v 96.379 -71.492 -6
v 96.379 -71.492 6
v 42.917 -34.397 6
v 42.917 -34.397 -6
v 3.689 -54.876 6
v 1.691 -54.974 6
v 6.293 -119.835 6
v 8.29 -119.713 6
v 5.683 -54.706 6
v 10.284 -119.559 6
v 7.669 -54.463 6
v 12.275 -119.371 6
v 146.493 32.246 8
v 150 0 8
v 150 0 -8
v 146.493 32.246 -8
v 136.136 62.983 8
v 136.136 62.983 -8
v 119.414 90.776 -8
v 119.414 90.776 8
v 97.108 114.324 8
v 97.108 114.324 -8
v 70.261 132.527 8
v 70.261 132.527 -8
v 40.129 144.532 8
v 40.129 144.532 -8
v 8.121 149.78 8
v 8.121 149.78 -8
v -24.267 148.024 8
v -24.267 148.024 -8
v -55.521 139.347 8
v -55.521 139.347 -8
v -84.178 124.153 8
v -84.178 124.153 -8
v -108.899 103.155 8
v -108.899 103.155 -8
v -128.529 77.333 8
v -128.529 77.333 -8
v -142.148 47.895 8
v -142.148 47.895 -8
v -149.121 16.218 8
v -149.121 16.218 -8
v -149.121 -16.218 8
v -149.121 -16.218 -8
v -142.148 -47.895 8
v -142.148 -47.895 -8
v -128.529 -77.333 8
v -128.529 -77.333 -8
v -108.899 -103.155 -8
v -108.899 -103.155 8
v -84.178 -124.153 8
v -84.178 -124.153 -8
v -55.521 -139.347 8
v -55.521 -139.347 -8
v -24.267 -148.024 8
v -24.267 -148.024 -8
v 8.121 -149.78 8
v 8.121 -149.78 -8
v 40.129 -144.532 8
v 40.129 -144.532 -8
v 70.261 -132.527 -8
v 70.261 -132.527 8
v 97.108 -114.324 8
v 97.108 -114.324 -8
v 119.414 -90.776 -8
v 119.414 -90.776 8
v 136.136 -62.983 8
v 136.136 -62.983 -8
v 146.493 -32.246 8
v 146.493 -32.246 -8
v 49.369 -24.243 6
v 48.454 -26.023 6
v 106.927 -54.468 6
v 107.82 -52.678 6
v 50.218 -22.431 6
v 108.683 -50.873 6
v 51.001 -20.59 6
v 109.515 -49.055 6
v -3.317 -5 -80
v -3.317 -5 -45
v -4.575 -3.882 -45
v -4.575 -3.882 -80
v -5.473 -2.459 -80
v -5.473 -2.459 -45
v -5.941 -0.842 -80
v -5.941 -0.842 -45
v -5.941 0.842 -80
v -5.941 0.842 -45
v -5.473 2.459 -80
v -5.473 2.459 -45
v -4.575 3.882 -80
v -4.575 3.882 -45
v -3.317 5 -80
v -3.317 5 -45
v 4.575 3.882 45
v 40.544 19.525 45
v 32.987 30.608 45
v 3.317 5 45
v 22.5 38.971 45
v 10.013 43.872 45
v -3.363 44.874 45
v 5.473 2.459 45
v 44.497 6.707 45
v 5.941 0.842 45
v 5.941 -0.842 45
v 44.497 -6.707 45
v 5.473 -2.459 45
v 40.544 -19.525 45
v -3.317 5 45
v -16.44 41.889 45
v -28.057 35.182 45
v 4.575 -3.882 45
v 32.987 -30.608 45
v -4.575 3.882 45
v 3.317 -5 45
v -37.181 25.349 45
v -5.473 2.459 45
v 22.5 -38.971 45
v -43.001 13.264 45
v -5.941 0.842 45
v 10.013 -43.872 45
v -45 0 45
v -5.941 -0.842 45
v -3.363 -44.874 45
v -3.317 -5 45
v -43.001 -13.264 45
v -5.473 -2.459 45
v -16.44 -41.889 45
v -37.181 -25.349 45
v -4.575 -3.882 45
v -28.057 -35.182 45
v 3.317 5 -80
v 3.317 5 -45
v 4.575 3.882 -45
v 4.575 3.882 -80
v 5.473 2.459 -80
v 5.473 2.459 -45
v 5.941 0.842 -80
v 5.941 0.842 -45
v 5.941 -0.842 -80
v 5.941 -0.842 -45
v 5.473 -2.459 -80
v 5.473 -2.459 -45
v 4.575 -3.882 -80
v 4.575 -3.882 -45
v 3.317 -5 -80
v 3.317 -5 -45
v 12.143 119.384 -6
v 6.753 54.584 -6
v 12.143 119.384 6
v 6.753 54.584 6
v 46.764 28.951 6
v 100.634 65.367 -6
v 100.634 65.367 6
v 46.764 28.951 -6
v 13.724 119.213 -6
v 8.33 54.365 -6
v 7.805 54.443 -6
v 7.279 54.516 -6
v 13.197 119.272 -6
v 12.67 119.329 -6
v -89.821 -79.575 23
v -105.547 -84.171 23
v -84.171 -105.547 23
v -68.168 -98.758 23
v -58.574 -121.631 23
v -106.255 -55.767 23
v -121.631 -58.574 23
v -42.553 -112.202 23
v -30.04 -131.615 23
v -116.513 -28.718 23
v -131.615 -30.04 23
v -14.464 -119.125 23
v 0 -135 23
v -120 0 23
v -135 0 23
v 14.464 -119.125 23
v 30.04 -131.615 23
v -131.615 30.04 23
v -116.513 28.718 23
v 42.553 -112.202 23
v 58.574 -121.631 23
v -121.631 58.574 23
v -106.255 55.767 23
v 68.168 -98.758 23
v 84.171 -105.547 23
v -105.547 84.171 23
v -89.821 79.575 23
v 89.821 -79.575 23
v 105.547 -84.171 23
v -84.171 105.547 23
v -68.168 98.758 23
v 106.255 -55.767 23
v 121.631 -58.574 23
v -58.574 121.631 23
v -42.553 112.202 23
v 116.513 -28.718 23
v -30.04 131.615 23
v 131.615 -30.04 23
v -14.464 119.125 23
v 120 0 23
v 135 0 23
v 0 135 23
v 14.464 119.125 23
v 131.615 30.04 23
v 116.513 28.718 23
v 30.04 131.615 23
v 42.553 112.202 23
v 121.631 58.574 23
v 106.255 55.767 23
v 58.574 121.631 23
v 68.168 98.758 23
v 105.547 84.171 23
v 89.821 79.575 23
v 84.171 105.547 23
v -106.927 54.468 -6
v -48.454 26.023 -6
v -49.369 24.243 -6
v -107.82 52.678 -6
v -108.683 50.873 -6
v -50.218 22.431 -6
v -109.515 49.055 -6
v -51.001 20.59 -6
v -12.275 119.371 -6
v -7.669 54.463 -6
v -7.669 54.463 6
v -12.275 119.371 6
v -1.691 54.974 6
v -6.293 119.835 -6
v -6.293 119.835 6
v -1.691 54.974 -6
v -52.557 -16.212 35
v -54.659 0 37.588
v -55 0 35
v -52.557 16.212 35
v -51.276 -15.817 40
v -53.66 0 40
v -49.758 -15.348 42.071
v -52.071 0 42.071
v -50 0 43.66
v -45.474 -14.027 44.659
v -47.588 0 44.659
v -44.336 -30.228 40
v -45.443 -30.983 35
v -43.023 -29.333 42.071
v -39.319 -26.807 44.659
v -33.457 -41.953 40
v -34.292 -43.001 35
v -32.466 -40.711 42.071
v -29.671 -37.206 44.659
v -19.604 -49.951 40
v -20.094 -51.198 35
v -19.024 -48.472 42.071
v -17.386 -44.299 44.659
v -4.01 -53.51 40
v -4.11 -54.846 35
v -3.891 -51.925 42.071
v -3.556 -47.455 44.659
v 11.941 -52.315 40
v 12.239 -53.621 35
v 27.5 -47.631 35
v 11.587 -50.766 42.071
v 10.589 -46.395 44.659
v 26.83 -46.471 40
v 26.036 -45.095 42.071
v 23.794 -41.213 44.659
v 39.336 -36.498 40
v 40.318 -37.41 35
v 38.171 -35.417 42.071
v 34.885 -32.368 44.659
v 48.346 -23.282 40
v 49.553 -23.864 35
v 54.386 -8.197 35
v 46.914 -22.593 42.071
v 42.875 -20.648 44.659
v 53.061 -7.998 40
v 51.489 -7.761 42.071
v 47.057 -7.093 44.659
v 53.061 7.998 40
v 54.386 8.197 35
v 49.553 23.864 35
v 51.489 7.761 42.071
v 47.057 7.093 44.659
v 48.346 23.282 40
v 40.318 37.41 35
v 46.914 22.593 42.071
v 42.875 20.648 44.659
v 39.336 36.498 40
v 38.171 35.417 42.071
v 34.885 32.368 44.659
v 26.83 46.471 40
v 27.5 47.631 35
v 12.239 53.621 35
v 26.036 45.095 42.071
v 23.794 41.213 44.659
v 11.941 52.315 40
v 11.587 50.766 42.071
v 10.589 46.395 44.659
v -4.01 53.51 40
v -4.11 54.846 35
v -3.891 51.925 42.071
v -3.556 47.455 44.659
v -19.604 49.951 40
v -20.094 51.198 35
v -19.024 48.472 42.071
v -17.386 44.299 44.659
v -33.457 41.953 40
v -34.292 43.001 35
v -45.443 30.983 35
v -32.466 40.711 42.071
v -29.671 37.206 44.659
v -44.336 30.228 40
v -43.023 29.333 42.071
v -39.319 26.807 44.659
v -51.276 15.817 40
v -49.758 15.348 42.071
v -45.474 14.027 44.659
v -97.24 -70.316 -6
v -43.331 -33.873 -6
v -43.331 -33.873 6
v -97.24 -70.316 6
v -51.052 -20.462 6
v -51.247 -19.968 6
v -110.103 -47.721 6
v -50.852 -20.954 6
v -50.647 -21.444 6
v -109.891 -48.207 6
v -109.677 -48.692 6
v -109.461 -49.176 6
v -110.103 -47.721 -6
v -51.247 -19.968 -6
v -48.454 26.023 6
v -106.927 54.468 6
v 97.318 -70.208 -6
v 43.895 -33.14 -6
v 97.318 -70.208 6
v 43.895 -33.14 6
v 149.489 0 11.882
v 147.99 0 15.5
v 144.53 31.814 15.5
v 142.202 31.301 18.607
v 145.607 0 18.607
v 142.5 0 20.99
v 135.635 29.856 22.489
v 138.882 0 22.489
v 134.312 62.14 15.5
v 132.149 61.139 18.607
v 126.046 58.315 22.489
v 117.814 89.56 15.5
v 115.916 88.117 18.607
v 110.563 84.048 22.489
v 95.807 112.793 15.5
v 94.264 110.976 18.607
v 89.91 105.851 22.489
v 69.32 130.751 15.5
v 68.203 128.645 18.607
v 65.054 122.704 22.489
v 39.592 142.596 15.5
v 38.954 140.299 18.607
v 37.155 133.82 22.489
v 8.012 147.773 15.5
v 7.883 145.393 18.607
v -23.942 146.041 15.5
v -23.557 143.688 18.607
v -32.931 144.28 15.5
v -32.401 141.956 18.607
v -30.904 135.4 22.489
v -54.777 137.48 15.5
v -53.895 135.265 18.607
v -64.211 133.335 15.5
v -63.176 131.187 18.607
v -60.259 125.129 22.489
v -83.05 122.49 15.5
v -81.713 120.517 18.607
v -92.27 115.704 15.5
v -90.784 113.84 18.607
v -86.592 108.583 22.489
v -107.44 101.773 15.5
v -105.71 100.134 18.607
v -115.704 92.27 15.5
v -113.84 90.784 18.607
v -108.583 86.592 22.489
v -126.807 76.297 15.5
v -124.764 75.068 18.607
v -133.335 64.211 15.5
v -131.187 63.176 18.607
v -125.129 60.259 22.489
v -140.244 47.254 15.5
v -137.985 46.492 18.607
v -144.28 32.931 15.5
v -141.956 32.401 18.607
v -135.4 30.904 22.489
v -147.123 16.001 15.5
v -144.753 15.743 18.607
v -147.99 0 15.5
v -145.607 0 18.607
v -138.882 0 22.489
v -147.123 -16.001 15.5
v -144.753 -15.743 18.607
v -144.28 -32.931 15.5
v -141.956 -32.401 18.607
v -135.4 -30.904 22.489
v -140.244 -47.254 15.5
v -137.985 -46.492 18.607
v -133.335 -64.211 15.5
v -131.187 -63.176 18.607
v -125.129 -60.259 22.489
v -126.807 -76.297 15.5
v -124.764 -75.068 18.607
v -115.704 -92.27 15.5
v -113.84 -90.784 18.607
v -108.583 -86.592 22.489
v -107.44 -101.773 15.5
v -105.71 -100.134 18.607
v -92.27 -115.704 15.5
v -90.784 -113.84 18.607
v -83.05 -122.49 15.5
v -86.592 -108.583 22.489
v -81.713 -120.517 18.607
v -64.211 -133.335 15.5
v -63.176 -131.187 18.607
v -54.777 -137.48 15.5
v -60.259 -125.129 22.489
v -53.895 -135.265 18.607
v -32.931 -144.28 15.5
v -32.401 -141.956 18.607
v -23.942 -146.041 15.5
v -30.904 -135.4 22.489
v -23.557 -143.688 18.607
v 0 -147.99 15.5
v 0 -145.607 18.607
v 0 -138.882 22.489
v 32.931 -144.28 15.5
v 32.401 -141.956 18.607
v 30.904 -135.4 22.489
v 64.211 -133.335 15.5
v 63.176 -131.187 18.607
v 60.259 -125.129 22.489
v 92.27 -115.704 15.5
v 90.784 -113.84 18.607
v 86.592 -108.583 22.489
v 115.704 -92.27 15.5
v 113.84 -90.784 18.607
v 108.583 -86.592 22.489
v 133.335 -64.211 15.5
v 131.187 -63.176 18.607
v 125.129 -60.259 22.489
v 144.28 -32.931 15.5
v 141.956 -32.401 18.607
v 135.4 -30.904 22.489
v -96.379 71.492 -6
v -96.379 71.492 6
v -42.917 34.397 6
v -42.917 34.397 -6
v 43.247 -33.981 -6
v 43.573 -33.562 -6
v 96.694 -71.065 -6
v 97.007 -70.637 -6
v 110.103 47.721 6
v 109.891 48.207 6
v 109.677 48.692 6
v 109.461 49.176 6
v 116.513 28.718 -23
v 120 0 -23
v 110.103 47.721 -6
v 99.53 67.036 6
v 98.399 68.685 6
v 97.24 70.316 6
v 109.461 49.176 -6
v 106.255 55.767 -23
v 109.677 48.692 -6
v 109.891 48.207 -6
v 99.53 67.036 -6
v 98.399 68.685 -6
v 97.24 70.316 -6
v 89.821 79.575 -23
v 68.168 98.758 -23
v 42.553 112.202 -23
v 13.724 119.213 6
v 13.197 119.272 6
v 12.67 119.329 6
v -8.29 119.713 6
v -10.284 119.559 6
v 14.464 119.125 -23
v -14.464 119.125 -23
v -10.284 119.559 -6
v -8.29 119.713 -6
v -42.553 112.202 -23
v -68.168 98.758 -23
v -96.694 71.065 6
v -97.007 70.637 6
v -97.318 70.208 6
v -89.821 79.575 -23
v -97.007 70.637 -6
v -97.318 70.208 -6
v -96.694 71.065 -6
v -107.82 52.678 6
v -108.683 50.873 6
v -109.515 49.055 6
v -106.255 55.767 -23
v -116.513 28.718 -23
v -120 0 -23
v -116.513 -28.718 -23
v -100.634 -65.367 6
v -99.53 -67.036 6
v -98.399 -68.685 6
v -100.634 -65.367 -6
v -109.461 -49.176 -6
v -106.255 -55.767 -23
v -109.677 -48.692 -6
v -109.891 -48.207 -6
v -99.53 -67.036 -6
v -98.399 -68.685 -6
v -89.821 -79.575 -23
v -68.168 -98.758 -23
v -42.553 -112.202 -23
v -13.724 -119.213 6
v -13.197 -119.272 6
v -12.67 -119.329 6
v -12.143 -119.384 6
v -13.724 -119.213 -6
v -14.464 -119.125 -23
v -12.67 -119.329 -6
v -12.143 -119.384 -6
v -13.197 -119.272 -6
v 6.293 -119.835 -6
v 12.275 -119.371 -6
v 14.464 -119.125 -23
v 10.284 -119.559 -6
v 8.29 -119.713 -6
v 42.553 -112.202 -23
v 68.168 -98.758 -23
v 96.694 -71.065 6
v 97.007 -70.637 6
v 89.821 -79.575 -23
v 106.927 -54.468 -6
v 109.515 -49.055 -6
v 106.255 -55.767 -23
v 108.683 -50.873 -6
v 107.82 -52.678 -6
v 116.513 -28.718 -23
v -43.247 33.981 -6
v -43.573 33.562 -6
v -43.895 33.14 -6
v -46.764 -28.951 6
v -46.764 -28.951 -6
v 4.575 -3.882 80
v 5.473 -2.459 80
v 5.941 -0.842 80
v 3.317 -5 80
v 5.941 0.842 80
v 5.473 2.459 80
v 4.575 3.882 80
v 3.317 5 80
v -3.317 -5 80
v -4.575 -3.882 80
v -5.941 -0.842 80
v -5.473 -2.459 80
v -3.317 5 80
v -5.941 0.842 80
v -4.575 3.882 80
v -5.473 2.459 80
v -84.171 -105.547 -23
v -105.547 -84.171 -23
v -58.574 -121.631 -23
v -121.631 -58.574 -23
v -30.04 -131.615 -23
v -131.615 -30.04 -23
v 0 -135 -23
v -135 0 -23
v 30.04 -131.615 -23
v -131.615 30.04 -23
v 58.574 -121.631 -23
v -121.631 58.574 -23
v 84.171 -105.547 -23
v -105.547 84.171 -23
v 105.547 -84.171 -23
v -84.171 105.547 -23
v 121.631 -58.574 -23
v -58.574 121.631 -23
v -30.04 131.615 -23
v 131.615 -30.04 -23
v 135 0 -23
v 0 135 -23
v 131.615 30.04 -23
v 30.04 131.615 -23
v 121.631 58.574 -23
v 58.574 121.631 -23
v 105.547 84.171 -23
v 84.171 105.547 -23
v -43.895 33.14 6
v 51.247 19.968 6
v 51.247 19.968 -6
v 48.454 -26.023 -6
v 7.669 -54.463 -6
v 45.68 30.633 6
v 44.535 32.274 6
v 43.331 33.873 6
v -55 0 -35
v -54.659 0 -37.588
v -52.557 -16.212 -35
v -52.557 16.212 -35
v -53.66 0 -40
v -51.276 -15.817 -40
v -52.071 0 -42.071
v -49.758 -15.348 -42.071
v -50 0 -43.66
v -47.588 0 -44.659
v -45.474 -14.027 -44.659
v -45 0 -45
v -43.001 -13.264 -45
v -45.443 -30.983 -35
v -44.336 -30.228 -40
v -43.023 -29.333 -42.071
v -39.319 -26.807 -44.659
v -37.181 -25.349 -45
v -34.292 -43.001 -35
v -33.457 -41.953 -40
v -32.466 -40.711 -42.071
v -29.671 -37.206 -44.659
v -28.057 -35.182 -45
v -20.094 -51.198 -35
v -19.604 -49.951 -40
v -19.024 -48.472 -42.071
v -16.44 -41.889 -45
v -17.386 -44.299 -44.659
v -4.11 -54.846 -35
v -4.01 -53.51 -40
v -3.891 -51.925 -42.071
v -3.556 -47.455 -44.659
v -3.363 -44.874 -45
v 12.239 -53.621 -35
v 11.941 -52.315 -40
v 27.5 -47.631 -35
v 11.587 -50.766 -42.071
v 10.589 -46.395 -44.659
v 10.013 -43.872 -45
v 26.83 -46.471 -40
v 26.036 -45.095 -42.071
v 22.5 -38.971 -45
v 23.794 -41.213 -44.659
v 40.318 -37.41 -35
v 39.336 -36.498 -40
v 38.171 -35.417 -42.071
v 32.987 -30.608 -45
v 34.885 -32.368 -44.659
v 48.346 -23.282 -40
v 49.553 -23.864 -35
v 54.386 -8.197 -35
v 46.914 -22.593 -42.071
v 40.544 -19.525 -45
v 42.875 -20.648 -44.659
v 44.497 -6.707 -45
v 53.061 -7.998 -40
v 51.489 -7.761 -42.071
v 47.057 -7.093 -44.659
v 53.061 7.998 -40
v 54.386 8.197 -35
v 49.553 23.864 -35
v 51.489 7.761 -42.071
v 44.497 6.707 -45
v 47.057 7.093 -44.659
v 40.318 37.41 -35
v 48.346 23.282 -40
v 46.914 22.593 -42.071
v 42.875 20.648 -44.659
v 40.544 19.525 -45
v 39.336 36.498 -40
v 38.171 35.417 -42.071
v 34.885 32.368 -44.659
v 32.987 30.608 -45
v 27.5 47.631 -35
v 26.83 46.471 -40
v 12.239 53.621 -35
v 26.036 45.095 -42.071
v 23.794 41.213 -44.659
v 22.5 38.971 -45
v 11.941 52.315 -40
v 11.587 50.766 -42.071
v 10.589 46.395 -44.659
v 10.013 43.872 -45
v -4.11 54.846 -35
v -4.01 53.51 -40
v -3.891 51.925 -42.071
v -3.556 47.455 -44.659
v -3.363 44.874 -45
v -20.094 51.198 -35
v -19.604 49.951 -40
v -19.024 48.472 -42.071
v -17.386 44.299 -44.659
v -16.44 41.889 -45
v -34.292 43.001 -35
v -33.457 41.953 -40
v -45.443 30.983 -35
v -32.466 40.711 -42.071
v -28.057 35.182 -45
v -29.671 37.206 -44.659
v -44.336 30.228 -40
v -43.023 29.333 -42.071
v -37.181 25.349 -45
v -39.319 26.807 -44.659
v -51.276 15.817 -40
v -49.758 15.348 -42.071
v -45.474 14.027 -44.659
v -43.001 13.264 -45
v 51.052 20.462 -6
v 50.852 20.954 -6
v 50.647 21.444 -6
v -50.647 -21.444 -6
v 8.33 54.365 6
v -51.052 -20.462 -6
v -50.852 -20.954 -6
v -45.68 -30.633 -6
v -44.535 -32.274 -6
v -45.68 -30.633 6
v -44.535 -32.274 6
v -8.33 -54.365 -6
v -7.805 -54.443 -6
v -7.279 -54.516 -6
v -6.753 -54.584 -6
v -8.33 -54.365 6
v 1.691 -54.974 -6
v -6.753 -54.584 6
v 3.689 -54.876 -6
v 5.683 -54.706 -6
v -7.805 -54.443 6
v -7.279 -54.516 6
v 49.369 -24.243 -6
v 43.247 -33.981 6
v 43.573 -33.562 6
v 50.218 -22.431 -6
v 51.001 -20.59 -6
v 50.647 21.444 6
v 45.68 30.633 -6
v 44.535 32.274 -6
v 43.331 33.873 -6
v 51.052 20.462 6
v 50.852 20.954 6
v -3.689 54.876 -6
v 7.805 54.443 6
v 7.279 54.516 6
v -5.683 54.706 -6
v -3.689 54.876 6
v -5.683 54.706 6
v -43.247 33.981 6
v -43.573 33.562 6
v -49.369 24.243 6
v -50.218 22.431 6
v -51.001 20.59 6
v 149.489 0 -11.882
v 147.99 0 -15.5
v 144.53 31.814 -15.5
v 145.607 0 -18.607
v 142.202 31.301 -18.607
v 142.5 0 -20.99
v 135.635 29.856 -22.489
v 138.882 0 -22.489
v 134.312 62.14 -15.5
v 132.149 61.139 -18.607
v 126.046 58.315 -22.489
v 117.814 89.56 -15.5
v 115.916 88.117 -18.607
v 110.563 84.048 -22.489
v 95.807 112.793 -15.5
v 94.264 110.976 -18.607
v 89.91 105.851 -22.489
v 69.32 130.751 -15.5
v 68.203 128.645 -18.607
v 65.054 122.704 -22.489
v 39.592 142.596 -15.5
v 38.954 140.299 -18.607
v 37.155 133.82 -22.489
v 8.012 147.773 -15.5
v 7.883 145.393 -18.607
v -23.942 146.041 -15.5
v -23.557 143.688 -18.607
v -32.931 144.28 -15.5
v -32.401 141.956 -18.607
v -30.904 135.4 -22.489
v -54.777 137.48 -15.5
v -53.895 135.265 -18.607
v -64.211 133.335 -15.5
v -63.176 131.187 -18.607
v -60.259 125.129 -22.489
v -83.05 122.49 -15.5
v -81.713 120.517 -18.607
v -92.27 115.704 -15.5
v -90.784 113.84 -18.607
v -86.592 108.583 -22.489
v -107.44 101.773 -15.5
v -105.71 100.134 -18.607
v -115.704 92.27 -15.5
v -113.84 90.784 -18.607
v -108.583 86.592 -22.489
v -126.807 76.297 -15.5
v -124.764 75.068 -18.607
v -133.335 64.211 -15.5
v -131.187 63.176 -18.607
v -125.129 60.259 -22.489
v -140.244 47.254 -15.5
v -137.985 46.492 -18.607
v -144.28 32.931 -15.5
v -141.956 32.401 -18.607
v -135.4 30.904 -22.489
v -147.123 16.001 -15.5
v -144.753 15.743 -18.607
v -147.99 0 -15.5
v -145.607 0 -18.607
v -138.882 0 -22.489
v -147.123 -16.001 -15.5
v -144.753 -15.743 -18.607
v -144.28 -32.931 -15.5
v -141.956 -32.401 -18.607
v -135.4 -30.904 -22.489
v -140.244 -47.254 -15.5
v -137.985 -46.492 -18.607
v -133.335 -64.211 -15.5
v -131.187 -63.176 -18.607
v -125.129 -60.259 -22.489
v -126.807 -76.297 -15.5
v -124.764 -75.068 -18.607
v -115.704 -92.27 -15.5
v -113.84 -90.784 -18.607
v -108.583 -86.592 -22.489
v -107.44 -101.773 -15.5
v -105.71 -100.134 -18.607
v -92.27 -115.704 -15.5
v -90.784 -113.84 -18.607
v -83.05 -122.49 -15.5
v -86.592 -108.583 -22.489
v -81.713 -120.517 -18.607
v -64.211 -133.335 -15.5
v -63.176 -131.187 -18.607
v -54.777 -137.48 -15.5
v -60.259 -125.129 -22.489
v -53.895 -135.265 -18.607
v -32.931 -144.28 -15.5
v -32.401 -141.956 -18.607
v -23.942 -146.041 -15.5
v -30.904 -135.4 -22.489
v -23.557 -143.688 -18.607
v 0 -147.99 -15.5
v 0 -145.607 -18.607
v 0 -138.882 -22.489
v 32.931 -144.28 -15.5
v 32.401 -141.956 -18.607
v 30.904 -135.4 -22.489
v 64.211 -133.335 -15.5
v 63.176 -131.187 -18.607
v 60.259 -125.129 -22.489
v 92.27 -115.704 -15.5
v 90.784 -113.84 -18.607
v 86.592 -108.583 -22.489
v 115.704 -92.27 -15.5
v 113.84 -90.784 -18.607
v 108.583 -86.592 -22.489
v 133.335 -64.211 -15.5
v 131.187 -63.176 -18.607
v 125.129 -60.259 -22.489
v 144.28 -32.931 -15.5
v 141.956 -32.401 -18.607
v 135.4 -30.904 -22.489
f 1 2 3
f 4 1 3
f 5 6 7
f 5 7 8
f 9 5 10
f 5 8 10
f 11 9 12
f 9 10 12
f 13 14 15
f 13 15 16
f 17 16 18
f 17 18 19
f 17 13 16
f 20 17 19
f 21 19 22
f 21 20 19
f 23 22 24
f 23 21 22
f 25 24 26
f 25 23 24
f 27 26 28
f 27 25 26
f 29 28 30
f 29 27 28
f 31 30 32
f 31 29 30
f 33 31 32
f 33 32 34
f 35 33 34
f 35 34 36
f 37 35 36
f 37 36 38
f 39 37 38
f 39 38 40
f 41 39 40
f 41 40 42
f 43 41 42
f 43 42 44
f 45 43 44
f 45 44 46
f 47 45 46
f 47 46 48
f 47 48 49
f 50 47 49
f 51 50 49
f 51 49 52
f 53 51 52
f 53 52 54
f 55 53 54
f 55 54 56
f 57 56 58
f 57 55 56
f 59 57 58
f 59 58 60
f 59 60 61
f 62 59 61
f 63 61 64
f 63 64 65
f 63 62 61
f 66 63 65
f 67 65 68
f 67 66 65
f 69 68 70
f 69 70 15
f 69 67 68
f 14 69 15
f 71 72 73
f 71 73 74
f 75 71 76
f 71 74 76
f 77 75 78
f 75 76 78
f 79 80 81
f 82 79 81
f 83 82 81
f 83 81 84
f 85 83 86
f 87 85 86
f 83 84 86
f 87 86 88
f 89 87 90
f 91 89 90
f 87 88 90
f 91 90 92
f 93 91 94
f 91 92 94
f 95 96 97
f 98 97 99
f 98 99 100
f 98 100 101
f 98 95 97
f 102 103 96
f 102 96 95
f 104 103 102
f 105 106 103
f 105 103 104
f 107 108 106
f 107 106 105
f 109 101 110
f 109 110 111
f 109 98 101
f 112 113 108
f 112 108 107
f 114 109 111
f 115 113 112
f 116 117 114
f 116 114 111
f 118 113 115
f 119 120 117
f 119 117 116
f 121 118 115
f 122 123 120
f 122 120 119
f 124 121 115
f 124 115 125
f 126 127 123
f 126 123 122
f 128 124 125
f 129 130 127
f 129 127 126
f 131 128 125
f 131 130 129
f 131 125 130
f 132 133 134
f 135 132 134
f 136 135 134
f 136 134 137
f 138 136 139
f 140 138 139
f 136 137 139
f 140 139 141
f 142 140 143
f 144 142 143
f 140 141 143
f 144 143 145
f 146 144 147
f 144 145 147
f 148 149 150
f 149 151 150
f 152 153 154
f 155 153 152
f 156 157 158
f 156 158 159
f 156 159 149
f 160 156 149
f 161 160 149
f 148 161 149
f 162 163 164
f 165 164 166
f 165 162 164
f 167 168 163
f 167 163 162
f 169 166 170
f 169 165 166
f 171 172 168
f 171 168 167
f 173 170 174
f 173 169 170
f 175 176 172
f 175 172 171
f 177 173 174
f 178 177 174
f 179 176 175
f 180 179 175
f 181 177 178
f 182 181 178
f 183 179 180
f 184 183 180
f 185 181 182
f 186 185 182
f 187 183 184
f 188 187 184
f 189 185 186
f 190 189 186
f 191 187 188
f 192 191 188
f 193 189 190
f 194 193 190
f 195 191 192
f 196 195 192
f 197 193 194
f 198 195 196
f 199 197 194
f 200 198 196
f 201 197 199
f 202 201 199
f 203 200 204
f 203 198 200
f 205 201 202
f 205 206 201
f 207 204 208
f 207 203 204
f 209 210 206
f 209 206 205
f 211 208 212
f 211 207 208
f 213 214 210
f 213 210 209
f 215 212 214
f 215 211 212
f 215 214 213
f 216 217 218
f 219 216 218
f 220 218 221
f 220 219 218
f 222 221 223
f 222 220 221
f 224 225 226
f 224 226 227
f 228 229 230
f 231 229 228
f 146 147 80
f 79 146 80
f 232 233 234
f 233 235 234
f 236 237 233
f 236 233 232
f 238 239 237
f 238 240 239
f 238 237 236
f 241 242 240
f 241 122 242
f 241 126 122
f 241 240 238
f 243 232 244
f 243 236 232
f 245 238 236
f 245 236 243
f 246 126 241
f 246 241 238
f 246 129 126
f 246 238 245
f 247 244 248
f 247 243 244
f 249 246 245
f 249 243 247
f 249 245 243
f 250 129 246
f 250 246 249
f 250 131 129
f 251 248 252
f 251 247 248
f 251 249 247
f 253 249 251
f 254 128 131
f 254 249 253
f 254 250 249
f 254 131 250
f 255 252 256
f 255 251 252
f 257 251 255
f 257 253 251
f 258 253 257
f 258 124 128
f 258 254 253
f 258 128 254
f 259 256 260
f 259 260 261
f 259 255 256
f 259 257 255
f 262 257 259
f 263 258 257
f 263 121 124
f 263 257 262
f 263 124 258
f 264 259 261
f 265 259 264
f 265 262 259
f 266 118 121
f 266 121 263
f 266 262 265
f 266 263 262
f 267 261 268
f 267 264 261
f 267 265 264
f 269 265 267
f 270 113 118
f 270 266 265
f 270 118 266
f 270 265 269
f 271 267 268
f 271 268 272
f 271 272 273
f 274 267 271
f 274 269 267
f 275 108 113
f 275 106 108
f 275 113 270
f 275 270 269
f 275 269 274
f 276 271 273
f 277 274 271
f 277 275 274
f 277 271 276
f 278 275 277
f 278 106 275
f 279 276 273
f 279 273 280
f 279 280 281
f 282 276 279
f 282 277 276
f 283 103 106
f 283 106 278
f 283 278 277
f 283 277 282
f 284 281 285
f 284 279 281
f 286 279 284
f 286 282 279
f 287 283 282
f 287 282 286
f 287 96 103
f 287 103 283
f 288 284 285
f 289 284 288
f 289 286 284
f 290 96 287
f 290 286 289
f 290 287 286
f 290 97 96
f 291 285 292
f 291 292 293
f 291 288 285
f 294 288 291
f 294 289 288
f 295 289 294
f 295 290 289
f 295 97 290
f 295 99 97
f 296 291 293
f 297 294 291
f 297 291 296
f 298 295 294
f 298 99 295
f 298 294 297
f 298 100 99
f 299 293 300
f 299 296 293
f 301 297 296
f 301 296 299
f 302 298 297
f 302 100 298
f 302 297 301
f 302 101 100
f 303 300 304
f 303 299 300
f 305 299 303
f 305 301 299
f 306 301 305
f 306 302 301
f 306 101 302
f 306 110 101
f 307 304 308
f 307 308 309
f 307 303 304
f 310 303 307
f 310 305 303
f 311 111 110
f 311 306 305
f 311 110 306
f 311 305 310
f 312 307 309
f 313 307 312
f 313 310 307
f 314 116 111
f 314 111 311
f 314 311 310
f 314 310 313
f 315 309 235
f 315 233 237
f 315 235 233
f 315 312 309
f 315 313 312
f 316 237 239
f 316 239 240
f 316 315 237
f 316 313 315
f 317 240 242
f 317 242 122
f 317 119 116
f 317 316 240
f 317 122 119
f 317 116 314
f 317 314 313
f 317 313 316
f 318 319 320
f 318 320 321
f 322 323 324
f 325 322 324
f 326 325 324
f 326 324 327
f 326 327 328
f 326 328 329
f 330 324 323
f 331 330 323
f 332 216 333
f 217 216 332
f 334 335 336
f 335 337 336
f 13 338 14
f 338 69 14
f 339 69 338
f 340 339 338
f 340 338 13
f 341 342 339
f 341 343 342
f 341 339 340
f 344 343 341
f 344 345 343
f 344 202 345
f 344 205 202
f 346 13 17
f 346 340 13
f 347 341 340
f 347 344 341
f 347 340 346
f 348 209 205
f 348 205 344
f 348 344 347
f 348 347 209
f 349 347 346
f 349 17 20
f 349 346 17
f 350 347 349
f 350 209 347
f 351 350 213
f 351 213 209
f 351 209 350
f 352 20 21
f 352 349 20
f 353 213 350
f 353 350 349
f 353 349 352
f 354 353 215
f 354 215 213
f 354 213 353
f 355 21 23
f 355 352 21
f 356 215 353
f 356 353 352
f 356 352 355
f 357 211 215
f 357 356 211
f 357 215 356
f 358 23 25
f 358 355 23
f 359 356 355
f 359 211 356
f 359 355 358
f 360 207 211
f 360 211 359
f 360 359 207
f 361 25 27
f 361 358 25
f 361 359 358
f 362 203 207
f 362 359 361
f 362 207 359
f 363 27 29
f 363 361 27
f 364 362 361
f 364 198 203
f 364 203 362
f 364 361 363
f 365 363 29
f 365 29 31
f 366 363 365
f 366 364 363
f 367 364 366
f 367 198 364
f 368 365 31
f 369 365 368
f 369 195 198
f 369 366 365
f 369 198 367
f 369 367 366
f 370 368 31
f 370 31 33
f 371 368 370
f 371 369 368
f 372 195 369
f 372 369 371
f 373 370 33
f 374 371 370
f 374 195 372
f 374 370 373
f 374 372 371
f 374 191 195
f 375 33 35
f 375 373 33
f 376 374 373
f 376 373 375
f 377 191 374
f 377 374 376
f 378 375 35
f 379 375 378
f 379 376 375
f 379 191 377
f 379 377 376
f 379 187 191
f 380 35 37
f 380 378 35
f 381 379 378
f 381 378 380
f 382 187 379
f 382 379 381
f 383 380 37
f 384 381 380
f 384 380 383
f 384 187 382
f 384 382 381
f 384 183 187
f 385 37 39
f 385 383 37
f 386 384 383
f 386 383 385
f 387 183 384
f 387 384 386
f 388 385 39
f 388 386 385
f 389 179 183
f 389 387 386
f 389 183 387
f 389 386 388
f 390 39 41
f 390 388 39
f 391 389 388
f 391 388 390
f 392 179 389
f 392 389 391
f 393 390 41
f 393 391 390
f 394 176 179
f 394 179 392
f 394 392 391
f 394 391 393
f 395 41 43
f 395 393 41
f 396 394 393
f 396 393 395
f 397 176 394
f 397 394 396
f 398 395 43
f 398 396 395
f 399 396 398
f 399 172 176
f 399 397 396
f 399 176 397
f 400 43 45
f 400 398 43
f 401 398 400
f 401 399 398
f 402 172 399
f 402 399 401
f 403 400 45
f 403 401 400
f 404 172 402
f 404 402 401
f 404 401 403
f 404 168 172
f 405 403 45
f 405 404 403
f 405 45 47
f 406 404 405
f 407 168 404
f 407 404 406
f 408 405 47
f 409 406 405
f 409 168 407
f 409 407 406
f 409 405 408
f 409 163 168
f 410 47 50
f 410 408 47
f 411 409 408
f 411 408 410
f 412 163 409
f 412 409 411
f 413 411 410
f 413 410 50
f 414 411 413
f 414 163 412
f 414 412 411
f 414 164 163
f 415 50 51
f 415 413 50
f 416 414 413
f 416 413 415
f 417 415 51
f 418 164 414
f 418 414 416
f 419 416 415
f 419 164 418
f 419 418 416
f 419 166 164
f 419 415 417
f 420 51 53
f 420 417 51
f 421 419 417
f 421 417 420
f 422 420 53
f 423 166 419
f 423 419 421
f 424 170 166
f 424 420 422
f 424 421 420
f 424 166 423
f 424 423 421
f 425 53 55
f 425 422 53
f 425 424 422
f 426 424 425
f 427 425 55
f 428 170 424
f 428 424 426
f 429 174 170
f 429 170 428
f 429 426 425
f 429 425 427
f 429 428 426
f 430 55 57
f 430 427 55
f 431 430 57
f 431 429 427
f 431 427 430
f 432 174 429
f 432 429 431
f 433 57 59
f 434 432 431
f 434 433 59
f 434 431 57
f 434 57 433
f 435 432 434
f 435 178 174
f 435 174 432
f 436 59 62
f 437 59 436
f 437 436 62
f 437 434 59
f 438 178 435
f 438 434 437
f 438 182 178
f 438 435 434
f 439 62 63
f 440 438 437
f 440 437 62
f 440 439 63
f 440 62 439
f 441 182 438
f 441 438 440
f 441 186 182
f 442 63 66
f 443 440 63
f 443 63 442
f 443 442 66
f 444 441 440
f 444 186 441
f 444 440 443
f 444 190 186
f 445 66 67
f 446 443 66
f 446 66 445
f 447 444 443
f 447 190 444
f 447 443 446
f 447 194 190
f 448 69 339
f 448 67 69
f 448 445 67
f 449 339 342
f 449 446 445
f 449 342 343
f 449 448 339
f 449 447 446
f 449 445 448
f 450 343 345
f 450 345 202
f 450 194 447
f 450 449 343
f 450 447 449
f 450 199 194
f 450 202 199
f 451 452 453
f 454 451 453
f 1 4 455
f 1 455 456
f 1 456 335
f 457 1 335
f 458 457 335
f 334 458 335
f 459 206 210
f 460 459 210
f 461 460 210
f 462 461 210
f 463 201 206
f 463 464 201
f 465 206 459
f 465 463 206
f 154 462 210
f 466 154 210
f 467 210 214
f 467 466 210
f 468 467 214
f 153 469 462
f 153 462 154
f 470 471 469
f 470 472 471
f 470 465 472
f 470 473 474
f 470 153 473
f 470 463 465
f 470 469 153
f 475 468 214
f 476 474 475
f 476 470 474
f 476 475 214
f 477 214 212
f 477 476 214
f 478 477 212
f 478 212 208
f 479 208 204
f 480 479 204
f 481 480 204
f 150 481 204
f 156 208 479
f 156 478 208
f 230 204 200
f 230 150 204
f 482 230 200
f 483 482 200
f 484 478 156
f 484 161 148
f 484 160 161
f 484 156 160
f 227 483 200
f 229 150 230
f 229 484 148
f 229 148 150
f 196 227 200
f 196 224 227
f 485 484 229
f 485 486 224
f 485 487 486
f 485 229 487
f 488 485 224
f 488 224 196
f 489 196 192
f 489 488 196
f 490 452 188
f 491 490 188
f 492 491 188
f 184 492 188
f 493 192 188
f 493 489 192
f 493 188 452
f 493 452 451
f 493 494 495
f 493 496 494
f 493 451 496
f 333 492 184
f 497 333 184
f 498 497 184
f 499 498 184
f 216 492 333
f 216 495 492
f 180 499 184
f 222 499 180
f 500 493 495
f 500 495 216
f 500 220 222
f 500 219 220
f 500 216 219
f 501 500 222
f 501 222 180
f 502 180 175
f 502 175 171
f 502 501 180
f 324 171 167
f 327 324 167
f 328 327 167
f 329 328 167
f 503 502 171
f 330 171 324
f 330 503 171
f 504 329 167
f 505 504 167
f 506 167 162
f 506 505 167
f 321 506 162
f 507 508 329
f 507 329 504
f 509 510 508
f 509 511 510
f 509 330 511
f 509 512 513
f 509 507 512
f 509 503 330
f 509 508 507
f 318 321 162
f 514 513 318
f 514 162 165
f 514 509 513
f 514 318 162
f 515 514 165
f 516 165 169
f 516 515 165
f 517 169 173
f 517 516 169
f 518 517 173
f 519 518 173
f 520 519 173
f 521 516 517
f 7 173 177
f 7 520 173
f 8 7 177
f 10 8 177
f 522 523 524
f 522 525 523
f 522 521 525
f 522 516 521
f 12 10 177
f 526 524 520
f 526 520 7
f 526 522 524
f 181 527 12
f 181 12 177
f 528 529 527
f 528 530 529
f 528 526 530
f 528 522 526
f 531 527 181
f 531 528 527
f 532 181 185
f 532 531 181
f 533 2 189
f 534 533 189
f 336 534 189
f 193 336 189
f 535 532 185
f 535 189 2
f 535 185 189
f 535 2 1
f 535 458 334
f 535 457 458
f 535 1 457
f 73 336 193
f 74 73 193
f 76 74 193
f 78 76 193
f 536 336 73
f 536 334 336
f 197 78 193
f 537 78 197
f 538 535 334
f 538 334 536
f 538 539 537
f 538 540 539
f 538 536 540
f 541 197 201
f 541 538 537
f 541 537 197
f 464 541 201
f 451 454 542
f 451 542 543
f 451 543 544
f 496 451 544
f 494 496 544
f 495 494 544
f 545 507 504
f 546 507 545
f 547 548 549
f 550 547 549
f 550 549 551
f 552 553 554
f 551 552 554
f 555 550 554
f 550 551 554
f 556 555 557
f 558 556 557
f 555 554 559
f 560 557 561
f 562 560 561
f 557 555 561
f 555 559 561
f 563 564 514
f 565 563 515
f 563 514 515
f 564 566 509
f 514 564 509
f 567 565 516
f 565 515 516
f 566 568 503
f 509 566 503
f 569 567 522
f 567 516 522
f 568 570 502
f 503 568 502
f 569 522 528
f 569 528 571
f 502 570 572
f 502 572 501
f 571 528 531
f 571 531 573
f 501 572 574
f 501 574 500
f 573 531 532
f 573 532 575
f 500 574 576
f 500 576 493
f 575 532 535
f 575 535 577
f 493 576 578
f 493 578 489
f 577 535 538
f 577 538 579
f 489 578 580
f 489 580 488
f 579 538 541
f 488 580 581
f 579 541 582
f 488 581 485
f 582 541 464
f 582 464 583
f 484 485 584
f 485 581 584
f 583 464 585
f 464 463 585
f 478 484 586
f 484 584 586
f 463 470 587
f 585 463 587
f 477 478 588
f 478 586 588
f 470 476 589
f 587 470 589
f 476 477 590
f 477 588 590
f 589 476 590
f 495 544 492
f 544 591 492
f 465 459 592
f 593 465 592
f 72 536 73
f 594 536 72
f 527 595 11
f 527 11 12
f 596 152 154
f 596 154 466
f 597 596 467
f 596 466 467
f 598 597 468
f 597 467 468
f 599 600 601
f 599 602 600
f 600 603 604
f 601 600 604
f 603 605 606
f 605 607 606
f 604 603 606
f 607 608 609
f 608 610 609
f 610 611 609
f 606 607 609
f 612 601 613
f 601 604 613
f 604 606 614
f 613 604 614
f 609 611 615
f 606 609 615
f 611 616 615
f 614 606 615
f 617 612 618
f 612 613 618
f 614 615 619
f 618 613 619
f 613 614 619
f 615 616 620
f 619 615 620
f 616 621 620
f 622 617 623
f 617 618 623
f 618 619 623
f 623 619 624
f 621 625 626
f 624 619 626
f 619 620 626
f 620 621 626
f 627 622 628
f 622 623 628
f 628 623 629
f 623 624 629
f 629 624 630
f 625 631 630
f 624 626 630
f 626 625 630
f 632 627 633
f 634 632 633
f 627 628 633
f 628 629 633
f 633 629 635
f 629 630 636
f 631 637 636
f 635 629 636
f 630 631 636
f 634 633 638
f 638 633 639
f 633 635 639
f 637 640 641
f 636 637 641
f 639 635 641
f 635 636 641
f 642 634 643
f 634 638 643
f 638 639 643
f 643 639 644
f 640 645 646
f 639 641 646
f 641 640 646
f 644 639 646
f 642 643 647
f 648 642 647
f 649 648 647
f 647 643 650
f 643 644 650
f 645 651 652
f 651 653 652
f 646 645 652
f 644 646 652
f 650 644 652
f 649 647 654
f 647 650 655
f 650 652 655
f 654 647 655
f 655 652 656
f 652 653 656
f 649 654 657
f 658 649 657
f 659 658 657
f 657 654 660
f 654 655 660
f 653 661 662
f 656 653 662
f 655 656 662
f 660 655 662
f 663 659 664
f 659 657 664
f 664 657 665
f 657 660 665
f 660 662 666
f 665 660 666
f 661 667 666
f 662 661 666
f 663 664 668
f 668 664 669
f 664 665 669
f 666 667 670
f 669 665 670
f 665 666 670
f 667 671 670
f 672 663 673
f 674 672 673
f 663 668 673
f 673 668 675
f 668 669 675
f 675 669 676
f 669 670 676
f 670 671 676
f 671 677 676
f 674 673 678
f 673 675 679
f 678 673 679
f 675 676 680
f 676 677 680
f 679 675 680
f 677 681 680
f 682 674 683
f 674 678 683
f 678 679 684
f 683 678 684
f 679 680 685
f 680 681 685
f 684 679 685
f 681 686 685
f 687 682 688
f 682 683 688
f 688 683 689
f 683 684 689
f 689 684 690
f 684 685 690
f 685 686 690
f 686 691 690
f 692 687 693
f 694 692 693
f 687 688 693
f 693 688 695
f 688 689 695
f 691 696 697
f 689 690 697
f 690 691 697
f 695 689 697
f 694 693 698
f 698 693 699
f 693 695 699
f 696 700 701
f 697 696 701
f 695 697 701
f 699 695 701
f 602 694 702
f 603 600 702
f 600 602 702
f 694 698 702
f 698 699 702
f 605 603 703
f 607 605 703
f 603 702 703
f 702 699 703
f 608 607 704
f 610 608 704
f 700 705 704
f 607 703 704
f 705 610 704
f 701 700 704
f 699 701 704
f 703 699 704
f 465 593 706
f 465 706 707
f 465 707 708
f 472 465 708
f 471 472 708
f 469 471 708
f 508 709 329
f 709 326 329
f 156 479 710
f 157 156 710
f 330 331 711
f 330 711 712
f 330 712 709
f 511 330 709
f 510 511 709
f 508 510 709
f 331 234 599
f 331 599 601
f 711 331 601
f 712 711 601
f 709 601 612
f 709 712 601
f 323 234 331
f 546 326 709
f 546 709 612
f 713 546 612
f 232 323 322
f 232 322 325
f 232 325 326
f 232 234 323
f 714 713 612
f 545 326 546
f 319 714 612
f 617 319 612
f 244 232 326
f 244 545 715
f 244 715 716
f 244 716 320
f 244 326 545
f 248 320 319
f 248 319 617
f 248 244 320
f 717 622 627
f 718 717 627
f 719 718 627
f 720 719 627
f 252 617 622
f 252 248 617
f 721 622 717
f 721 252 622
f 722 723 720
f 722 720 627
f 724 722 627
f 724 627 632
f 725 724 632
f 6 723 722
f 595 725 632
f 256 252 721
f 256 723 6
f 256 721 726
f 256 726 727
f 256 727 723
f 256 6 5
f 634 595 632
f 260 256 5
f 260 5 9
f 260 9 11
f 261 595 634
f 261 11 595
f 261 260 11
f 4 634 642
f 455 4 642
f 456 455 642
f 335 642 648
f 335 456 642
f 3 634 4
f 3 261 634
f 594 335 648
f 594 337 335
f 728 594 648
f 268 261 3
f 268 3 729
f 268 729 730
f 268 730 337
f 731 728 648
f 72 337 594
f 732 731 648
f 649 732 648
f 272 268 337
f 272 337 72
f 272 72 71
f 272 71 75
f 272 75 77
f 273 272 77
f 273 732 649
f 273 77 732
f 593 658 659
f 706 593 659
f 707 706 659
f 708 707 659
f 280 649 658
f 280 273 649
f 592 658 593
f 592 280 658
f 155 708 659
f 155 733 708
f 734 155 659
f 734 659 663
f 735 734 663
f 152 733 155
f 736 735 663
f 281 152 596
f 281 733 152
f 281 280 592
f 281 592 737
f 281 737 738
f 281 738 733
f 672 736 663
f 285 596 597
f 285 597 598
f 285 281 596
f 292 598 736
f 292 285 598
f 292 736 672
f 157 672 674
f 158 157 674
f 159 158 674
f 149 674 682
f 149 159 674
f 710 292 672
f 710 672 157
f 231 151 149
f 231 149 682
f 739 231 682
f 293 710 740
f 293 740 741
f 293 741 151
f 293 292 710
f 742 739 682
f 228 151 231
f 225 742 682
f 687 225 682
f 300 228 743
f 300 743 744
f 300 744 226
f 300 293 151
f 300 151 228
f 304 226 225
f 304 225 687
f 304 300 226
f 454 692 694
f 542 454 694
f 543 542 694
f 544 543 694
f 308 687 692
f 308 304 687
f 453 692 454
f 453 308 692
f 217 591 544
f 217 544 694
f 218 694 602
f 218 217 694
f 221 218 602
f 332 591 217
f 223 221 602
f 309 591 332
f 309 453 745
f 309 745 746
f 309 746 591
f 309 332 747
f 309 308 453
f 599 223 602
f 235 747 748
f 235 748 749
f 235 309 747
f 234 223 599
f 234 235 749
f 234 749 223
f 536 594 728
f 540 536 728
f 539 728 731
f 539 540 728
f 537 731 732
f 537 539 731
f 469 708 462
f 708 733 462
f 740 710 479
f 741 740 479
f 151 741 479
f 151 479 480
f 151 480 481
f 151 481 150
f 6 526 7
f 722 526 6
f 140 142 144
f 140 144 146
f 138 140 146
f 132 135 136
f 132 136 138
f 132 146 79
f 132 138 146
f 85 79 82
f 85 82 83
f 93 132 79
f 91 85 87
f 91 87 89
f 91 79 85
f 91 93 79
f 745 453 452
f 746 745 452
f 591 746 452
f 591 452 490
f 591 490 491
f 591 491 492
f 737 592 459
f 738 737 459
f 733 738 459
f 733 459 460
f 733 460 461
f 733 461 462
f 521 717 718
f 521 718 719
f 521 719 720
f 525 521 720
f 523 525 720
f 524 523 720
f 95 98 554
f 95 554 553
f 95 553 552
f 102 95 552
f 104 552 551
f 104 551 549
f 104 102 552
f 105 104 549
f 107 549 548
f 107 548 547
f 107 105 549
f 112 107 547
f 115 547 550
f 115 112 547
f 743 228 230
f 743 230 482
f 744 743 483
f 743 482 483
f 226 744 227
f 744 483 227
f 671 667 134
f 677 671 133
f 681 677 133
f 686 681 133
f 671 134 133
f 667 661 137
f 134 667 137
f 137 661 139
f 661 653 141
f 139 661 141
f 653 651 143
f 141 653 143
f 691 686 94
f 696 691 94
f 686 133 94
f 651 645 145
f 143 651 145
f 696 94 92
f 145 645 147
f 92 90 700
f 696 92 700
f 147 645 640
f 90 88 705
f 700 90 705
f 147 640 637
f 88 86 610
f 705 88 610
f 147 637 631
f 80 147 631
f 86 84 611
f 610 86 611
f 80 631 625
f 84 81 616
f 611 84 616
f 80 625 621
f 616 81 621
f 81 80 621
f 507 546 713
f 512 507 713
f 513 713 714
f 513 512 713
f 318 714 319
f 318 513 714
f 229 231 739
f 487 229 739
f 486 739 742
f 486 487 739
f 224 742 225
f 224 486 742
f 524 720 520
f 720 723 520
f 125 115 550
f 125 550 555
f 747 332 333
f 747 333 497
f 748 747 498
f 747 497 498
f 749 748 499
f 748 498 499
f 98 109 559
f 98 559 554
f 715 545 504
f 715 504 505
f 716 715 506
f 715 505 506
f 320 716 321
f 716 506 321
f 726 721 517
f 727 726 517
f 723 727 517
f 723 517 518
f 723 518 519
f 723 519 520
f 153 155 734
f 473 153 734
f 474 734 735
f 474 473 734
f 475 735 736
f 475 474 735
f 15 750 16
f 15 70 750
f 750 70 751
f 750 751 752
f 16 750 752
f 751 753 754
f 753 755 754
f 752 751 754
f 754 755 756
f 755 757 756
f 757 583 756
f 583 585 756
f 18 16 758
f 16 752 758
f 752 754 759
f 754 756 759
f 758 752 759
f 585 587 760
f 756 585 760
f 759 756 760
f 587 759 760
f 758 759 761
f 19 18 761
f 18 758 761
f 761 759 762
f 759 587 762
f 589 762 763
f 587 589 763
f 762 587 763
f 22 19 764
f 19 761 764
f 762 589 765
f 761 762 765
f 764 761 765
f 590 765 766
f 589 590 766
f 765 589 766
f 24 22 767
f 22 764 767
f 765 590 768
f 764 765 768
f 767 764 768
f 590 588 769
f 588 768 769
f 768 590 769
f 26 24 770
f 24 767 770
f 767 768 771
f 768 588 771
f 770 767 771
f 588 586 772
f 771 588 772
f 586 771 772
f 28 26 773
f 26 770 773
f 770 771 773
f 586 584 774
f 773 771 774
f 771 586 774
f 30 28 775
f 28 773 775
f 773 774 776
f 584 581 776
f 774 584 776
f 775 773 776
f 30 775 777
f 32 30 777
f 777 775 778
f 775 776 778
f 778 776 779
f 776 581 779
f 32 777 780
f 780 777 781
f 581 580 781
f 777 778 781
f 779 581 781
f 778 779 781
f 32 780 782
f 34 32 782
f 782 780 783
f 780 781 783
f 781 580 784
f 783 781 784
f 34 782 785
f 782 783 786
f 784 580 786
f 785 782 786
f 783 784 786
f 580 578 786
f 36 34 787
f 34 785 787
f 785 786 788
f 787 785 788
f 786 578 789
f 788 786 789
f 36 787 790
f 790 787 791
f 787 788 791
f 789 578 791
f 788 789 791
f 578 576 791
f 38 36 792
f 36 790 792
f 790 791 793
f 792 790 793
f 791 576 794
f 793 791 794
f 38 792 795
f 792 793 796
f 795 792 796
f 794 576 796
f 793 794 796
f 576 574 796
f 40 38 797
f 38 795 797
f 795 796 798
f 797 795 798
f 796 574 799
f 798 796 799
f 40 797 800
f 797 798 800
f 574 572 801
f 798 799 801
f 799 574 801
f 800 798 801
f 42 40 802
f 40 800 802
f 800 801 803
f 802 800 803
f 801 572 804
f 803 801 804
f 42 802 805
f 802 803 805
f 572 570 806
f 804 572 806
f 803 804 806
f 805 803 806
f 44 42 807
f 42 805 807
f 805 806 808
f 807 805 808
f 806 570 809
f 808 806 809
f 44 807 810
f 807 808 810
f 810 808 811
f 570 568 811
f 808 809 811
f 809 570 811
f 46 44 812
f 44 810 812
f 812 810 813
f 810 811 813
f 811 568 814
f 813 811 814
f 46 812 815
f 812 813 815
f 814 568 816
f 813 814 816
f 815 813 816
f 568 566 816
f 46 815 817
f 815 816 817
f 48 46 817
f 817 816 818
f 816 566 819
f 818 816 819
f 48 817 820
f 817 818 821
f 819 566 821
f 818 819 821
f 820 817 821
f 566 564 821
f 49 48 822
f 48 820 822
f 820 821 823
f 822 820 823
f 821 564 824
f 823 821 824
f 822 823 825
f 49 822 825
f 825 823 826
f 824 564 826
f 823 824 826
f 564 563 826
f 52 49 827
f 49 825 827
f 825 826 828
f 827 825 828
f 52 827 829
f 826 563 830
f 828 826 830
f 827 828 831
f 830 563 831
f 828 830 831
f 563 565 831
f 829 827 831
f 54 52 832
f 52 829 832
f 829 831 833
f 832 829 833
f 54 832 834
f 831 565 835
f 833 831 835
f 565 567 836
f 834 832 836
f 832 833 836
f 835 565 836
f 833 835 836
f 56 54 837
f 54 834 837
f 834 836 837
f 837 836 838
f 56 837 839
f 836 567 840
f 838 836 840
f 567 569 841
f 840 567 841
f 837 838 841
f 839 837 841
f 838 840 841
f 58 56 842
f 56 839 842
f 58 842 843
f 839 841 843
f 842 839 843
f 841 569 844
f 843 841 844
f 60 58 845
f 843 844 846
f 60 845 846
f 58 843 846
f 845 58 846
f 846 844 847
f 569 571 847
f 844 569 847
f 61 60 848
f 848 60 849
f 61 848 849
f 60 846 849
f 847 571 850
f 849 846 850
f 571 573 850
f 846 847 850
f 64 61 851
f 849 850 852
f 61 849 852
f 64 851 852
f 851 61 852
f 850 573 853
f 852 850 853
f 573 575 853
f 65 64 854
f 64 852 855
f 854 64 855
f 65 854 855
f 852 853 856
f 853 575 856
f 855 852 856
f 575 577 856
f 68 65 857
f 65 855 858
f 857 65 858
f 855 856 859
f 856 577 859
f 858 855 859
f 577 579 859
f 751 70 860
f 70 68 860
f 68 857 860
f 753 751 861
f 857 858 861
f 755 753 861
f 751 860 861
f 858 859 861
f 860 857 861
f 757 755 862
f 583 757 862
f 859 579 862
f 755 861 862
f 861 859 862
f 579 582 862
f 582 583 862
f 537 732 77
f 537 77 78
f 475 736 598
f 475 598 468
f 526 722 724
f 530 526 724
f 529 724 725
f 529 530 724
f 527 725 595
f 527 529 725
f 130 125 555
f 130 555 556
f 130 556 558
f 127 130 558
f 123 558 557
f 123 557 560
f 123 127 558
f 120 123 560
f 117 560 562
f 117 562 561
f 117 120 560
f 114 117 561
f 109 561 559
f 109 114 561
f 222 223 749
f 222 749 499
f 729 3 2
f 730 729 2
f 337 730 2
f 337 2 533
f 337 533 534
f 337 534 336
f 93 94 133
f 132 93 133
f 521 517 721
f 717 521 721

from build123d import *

# Parameters (mm, degrees)
SKETCH1_R           = 55
BOSS_EXTRUDE1_DEPTH = 45
SKETCH2_R           = 150
SKETCH2_R_2         = 120
BOSS_EXTRUDE2_DEPTH = 23
BOSS_EXTRUDE3_DEPTH = 6
CIRPATTERN15_COUNT  = 6
FILLET1_R           = 15
BOSS_EXTRUDE4_DEPTH = 35
FILLET2_R           = 10


with BuildPart() as part:
    # Sketch1 → Boss-Extrude1 (new, symmetric)
    with BuildSketch(Plane.XY):
        Circle(SKETCH1_R)
    extrude(amount=BOSS_EXTRUDE1_DEPTH, both=True)



with BuildPart() as body_2:
    # Sketch2 → Boss-Extrude2 (new, symmetric)
    with BuildSketch(Plane.XY):
        Circle(SKETCH2_R)
        Circle(SKETCH2_R_2, mode=Mode.SUBTRACT)
    extrude(amount=BOSS_EXTRUDE2_DEPTH, both=True)


with BuildPart() as part_1:
    add(part.part)

    add(body_2.part)  # Boss-Extrude3 merges body 2
    # Sketch3 → Boss-Extrude3 (add, symmetric)
    with BuildSketch(Plane.XY):
        with BuildLine():
            Line((-6.292975555, 119.834879975), (-1.690507098, 54.974013732))
            ThreePointArc((-1.690507098, 54.974013732), (-4.686886811, 54.799936971), (-7.669308753, 54.462663387))
            Line((-7.669308753, 54.462663387), (-12.275111778, 119.370522454))
            ThreePointArc((-12.275111778, 119.370522454), (-9.286946418, 119.640096231), (-6.292975555, 119.834879975))
        make_face()
        with BuildLine():
            Line((13.724408526, 119.212585789), (8.33039605, 54.365471594))
            ThreePointArc((8.33039605, 54.365471594), (7.542379524, 54.480386481), (6.752781779, 54.583879839))
            Line((6.752781779, 54.583879839), (12.142889029, 119.38404519))
            ThreePointArc((12.142889029, 119.38404519), (12.933932901, 119.300936206), (13.724408526, 119.212585789))
        make_face()
    boss_extrude3 = extrude(amount=BOSS_EXTRUDE3_DEPTH, both=True)

    # CirPattern15: Boss-Extrude3 ×6 about axis
    cirpattern15_axis = Axis((0, 0, -53.35), (0, 0, 1))
    for i in range(1, CIRPATTERN15_COUNT):
        add(boss_extrude3.rotate(cirpattern15_axis, i * 360 / CIRPATTERN15_COUNT))

    # Fillet1
    fillet1_edges = [part_1.edges().sort_by_distance(p)[0] for p in [
        (-150, 0, -23),
        (-150, 0, 23),
    ]]
    fillet(fillet1_edges, radius=FILLET1_R)

    # Sketch5 → Boss-Extrude4 (add)
    with BuildSketch(Plane.XY.offset(45)):
        with BuildLine():
            Line((-3.31662479, 5), (3.31662479, 5))
            ThreePointArc((3.31662479, 5), (6, 0), (3.31662479, -5))
            Line((3.31662479, -5), (-3.31662479, -5))
            ThreePointArc((-3.31662479, -5), (-6, 0), (-3.31662479, 5))
        make_face()
    boss_extrude4 = extrude(amount=BOSS_EXTRUDE4_DEPTH)

    # Mirror1: Boss-Extrude4 across plane
    add(boss_extrude4.mirror(Plane.XY))

    # Fillet2
    fillet2_edges = [part_1.edges().sort_by_distance(p)[0] for p in [
        (-55, 0, 45),
        (-55, 0, -45),
    ]]
    fillet(fillet2_edges, radius=FILLET2_R)


solid = part_1.part
